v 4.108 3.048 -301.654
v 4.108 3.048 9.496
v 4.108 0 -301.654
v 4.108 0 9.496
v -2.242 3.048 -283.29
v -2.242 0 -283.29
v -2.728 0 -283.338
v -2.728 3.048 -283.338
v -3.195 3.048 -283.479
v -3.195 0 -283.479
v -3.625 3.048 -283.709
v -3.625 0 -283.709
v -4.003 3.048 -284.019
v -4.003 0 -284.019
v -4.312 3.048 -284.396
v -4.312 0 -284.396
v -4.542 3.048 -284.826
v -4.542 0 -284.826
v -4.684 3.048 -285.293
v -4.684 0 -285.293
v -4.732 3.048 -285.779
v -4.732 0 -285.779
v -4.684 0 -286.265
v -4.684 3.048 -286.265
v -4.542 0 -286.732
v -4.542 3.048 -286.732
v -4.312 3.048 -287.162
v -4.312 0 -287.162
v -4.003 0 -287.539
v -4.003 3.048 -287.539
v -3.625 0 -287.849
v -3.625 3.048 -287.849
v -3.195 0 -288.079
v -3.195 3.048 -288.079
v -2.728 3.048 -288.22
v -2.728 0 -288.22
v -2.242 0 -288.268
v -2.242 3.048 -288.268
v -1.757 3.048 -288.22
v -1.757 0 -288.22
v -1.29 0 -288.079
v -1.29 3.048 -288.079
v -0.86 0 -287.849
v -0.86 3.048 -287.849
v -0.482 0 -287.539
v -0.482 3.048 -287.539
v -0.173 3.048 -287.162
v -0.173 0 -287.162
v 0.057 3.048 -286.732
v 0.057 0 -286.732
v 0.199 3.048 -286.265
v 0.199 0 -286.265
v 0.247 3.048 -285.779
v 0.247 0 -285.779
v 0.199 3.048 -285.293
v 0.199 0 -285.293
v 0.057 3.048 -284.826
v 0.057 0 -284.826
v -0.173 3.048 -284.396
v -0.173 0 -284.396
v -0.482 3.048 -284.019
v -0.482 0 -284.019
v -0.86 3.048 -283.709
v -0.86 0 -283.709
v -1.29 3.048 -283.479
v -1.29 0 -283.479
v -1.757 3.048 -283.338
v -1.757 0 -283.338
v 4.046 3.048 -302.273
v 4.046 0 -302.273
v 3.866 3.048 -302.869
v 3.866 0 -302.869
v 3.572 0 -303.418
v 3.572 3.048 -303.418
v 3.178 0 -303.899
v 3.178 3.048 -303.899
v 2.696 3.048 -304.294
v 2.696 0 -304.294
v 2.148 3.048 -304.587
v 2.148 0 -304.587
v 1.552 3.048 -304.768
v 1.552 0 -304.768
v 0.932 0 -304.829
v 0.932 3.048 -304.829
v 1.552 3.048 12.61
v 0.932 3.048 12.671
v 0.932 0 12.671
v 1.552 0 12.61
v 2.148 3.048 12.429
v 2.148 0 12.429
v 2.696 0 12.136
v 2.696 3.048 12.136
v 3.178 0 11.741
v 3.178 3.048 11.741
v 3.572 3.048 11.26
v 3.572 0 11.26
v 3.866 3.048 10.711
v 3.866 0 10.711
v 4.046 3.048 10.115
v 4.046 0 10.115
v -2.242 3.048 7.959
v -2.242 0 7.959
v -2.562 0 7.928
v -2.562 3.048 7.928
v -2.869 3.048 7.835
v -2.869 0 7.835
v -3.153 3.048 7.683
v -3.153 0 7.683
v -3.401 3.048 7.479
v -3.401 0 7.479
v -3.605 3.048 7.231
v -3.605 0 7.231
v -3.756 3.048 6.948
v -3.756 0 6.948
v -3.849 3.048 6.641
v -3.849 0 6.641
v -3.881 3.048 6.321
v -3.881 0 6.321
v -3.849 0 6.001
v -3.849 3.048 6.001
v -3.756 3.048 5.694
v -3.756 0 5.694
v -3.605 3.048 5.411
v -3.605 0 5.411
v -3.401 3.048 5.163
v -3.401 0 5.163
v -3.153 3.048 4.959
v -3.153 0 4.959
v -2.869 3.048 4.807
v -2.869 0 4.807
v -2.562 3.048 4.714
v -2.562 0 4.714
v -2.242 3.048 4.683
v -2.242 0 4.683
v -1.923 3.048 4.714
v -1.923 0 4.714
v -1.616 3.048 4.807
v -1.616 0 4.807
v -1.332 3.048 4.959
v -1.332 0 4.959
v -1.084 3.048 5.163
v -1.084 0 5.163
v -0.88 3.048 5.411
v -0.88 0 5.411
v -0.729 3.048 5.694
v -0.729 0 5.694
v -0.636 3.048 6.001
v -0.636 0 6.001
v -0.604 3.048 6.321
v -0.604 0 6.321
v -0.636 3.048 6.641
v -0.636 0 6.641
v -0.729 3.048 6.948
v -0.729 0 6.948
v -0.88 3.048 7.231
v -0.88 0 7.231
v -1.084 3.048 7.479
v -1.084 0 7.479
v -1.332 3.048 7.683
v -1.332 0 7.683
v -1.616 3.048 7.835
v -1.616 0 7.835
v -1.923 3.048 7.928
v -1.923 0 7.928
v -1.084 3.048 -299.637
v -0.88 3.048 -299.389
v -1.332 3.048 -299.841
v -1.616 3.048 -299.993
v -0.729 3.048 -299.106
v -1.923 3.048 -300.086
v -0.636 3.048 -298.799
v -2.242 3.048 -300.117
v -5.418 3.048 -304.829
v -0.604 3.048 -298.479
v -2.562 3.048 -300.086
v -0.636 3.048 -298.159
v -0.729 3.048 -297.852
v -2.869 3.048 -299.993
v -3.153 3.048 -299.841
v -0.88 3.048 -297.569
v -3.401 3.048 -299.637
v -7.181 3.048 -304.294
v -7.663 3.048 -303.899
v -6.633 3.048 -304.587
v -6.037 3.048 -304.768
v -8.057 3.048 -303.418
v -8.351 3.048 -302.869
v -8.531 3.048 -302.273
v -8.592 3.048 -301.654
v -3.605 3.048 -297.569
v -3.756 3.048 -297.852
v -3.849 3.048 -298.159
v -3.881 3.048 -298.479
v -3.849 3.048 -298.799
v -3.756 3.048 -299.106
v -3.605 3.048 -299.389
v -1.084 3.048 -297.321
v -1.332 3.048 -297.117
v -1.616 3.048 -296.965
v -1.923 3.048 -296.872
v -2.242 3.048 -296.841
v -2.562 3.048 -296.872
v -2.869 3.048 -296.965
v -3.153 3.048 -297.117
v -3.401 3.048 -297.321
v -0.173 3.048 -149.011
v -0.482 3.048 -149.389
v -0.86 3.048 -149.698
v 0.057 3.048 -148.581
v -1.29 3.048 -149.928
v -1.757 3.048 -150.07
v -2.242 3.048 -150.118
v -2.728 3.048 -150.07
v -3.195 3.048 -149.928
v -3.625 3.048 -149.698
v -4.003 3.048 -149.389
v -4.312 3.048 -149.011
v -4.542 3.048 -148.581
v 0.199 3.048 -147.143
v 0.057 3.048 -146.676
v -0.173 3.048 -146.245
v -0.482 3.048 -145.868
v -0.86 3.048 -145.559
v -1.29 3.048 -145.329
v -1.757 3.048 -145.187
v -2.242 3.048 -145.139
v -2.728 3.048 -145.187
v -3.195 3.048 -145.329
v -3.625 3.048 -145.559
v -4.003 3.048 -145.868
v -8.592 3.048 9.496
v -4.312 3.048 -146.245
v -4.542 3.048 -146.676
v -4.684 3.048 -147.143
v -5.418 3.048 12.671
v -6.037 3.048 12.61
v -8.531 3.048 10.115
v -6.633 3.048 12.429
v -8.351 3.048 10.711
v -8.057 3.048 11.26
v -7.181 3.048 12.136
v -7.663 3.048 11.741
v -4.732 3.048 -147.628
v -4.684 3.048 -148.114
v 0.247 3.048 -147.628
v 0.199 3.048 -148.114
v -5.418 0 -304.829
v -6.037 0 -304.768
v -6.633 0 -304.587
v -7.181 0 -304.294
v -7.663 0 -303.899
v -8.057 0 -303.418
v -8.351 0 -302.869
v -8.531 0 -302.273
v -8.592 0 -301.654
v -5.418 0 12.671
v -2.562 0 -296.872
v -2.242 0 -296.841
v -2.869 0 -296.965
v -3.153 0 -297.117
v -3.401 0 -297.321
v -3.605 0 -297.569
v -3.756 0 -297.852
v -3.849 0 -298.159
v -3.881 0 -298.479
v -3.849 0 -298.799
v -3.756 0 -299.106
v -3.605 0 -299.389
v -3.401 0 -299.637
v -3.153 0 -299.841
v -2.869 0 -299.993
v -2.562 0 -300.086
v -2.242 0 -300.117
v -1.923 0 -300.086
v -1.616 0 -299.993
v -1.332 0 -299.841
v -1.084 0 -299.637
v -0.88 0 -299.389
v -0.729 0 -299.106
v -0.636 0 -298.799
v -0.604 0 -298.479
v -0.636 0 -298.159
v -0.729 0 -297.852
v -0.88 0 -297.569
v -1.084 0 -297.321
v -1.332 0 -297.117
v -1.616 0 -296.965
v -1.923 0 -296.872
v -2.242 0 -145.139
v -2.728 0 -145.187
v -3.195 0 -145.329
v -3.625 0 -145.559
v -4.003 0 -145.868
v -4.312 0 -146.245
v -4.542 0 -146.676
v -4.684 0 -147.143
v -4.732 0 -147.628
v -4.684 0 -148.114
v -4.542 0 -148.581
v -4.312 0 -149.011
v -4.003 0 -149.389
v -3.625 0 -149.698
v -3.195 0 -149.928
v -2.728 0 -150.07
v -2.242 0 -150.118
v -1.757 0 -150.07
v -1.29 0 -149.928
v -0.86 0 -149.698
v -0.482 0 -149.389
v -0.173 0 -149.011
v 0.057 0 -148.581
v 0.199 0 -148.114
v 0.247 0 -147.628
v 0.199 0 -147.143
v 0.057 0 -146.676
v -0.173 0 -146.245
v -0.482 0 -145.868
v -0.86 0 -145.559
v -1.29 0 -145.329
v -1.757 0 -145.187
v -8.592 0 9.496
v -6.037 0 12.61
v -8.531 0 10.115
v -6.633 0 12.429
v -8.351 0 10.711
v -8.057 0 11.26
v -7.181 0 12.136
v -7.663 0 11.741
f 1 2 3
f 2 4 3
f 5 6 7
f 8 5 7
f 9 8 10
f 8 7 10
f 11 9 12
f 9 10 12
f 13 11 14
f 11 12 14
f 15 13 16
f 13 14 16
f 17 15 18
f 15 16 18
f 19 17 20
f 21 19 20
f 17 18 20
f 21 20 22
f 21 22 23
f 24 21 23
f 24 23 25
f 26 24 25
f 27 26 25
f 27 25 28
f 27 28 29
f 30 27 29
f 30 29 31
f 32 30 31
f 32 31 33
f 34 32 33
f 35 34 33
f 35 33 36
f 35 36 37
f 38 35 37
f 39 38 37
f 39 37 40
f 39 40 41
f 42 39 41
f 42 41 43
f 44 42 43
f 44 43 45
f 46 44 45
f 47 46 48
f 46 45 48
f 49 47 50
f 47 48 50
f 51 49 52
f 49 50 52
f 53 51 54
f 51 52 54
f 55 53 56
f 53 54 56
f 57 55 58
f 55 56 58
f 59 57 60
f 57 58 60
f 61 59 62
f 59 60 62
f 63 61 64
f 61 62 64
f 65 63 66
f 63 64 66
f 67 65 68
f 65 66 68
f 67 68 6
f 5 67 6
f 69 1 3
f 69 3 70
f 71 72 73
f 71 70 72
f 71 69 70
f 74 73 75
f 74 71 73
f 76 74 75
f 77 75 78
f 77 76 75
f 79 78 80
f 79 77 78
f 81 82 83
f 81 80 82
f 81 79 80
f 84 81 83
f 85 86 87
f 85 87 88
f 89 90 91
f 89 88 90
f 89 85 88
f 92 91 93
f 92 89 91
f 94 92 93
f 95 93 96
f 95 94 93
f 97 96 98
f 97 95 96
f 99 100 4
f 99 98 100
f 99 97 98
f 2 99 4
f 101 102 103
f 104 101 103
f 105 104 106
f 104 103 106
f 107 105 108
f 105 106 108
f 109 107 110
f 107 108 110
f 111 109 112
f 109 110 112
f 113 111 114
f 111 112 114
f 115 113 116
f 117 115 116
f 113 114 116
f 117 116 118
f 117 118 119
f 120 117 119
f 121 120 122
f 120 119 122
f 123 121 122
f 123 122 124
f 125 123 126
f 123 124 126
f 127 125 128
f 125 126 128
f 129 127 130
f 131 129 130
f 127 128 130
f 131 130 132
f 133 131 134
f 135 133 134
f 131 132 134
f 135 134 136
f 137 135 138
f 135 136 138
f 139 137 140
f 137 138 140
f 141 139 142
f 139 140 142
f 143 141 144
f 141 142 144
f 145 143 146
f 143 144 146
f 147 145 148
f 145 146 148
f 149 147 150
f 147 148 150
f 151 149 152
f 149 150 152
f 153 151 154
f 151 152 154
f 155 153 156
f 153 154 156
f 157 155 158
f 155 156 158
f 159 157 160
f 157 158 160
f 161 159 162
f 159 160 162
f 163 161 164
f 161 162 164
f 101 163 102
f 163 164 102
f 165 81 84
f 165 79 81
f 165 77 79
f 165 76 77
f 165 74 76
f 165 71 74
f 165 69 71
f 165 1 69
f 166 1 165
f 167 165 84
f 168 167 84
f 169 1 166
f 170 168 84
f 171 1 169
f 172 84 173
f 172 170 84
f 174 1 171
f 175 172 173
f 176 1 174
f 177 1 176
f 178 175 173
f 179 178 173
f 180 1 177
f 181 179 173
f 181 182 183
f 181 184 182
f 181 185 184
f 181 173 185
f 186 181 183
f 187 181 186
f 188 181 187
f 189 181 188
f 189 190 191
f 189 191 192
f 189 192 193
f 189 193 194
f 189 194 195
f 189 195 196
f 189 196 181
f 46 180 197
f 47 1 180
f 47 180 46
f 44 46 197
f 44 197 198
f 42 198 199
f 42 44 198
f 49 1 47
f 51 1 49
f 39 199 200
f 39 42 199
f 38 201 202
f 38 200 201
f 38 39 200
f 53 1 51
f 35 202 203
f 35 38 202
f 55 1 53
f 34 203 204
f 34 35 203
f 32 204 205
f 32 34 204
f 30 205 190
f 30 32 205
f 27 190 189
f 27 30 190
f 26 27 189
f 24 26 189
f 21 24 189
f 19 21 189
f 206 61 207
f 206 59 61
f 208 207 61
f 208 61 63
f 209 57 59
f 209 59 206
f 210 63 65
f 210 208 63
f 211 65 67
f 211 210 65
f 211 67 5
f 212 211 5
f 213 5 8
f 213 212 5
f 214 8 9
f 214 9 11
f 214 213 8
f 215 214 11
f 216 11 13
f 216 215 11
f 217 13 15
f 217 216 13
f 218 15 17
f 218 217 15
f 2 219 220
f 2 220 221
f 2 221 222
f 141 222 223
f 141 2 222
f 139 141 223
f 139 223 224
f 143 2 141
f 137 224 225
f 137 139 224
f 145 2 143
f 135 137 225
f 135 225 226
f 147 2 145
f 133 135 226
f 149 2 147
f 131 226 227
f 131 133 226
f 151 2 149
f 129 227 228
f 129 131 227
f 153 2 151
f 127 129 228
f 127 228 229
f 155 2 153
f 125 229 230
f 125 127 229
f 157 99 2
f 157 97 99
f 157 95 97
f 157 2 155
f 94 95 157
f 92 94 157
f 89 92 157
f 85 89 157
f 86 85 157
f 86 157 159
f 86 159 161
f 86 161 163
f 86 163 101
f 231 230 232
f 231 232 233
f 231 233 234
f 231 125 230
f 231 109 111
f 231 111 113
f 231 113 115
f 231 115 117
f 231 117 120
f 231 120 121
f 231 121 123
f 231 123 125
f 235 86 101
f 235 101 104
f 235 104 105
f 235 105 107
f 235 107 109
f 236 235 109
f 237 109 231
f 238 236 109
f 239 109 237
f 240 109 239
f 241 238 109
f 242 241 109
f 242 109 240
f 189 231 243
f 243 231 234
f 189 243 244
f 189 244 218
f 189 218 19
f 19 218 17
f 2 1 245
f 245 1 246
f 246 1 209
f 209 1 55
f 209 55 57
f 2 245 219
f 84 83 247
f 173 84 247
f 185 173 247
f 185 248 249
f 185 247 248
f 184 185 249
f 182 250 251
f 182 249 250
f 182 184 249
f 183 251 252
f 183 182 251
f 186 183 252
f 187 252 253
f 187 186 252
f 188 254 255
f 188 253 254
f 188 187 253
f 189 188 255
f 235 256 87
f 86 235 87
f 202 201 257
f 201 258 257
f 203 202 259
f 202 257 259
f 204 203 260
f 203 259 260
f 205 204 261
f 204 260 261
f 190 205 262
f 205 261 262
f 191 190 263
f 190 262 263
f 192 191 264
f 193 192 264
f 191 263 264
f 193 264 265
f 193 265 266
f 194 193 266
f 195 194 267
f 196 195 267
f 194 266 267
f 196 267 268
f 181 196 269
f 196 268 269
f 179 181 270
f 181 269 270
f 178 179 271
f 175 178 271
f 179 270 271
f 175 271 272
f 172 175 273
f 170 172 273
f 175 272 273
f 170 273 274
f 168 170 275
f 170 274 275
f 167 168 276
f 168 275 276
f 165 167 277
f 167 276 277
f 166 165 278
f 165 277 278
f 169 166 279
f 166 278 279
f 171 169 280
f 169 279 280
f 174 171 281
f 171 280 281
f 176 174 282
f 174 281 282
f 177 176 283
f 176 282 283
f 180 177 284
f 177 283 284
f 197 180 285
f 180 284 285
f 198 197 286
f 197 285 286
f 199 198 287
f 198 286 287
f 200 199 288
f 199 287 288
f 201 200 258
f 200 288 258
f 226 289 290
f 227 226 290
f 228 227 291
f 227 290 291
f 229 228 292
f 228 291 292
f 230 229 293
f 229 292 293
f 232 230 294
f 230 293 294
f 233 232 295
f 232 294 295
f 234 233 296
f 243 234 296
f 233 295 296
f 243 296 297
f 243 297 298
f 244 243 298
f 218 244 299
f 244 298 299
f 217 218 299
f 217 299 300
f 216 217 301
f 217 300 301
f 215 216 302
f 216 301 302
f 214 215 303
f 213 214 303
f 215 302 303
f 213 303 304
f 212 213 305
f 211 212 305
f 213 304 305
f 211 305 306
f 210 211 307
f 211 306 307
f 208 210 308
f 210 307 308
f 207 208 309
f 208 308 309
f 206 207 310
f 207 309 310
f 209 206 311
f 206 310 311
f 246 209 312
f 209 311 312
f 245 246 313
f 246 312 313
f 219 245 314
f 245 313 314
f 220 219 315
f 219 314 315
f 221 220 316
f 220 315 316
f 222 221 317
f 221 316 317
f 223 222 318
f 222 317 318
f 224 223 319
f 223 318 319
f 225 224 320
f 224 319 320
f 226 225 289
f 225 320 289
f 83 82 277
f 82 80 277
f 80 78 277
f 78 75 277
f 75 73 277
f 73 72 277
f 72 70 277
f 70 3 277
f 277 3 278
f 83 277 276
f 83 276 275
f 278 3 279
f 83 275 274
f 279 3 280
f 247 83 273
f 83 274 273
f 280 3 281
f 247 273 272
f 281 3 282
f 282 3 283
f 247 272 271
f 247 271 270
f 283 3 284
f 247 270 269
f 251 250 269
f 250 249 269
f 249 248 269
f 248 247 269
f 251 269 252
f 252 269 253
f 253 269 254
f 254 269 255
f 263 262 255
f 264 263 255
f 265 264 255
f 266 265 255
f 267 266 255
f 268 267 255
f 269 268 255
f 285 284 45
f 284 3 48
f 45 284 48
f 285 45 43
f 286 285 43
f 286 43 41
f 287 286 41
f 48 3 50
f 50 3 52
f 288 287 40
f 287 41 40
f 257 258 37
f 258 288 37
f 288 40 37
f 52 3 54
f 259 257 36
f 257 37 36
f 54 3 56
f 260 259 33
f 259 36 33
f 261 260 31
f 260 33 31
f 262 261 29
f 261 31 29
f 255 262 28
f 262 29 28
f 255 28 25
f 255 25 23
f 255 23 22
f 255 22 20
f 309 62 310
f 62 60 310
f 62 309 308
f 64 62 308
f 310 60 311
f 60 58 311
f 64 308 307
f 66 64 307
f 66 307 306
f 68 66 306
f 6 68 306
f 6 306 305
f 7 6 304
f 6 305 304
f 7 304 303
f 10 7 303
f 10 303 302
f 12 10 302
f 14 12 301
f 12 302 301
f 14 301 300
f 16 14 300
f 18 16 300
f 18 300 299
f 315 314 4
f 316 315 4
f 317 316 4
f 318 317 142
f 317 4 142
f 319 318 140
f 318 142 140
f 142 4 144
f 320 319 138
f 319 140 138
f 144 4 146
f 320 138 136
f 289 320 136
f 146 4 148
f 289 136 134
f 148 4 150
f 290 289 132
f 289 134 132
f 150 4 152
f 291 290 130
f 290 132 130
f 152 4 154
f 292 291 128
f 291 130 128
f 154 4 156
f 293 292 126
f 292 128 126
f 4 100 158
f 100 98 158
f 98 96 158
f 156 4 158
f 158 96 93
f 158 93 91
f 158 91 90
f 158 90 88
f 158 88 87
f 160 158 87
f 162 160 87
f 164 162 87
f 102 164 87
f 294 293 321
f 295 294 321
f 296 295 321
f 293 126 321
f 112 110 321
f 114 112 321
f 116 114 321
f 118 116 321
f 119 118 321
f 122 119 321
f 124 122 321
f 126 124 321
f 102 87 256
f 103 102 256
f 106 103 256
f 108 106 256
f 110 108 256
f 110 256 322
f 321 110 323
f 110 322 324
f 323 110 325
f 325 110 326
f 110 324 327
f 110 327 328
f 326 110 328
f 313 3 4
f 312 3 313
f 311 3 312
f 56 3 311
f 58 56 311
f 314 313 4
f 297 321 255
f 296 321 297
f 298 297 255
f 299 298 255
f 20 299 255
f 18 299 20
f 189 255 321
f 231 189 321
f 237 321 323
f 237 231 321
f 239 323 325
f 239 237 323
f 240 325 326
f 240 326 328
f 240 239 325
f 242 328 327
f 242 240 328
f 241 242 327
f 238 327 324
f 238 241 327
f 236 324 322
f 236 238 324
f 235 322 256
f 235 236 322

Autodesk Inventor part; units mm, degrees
ref_plane "YZ Plane" through (0, 0, 0) normal (1, 0, 0) x (0, 1, 0)
ref_plane "XZ Plane" through (0, 0, 0) normal (0, 1, 0) x (-1, 0, 0)
ref_plane "XY Plane" through (0, 0, 0) normal (0, 0, 1) x (1, 0, 0)
sketch "Sketch1" plane through (0, 0, 0) normal (0, 1, 0) x (-1, 0, 0)
  line L0 (8.5925, 12.671) -> (-4.1075, 12.671)
  line L1 (-4.1075, 12.671) -> (-4.1075, -304.829)
  line L2 (-4.1075, -304.829) -> (8.5925, -304.829)
  line L3 (8.5925, -304.829) -> (8.5925, 12.671)
  point P0 (0, 0)
  dimension "d0" = 12.7
  dimension "d1" = 317.5
extrude "Plate1" add sketch "Sketch1" along normal blind 3.048
fillet "Corner Round1" radius 3.175 4 edges at (4.1075, 1.524, 12.671) (-8.5925, 1.524, 12.671) (-8.5925, 1.524, -304.829) (4.1075, 1.524, -304.829)
sketch "Sketch2" plane through (0, 3.048, 0) normal (0, 1, 0) x (1, 0, 0)
  line L0 (0.9325, -12.671) -> (-5.4175, -12.671) projected
  line L1 (4.1075, 301.654) -> (4.1075, -9.496) projected
  line L2 (-5.4175, 304.829) -> (0.9325, 304.829) projected
  point P0 (0, 0)
  point P1 (-2.2425, -6.321)
  point P2 (-2.2425, 298.479)
  dimension "d4" = 6.35
  dimension "d5" = 6.35
  dimension "d6" = 6.35
  dimension "d7" = 6.35
hole "Hole1" at (-2.2425, 3.048, 6.321) at (-2.2425, 3.048, -298.479) direction (0, -1, 0) diameter 3.2766 end through all clearance for "Flat Head Machine Screw (82)" size "#4" standard "Ansi Unified Screw Threads"
sketch "Sketch3" plane through (0, 3.048, 0) normal (0, 1, 0) x (1, 0, 0)
  line L0 (4.1075, 301.654) -> (4.1075, -9.496) projected
  circle A0 centre (-2.2425, 298.479) radius 1.6383 projected
  point P0 (0, 0)
  point P1 (-2.2425, 285.779)
  point P2 (-2.2425, 147.6284)
  dimension "d15" = 6.35
  dimension "d16" = 6.35
  dimension "d17" = 138.1506
  dimension "d18" = 12.7
hole "Hole2" at (-2.2425, 3.048, -285.779) at (-2.2425, 3.048, -147.6284) direction (0, -1, 0) diameter 4.9784 end through all thread size "1/4-20 UNC" class "2B" standard "ANSI Unified Screw Threads"
equation "\"BendRadius\" = Thickness"
equation "\"BendReliefWidth\" = Thickness"
equation "\"BendReliefDepth\" = 0.5 * Thickness"
equation "\"CornerReliefSize\" = 4 * Thickness"
equation "\"MinimumRemnant\" = 2 * Thickness"
equation "\"TransitionRadius\" = BendRadius"
equation "\"JacobiRadiusSize\" = BendRadius"
equation "\"GapSize\" = Thickness"
equation "\"d2\" = BendRadius"
equation "\"Thickness\" = 3.048"
properties part number "Compressor_Strut" material "Aluminum 6061"
